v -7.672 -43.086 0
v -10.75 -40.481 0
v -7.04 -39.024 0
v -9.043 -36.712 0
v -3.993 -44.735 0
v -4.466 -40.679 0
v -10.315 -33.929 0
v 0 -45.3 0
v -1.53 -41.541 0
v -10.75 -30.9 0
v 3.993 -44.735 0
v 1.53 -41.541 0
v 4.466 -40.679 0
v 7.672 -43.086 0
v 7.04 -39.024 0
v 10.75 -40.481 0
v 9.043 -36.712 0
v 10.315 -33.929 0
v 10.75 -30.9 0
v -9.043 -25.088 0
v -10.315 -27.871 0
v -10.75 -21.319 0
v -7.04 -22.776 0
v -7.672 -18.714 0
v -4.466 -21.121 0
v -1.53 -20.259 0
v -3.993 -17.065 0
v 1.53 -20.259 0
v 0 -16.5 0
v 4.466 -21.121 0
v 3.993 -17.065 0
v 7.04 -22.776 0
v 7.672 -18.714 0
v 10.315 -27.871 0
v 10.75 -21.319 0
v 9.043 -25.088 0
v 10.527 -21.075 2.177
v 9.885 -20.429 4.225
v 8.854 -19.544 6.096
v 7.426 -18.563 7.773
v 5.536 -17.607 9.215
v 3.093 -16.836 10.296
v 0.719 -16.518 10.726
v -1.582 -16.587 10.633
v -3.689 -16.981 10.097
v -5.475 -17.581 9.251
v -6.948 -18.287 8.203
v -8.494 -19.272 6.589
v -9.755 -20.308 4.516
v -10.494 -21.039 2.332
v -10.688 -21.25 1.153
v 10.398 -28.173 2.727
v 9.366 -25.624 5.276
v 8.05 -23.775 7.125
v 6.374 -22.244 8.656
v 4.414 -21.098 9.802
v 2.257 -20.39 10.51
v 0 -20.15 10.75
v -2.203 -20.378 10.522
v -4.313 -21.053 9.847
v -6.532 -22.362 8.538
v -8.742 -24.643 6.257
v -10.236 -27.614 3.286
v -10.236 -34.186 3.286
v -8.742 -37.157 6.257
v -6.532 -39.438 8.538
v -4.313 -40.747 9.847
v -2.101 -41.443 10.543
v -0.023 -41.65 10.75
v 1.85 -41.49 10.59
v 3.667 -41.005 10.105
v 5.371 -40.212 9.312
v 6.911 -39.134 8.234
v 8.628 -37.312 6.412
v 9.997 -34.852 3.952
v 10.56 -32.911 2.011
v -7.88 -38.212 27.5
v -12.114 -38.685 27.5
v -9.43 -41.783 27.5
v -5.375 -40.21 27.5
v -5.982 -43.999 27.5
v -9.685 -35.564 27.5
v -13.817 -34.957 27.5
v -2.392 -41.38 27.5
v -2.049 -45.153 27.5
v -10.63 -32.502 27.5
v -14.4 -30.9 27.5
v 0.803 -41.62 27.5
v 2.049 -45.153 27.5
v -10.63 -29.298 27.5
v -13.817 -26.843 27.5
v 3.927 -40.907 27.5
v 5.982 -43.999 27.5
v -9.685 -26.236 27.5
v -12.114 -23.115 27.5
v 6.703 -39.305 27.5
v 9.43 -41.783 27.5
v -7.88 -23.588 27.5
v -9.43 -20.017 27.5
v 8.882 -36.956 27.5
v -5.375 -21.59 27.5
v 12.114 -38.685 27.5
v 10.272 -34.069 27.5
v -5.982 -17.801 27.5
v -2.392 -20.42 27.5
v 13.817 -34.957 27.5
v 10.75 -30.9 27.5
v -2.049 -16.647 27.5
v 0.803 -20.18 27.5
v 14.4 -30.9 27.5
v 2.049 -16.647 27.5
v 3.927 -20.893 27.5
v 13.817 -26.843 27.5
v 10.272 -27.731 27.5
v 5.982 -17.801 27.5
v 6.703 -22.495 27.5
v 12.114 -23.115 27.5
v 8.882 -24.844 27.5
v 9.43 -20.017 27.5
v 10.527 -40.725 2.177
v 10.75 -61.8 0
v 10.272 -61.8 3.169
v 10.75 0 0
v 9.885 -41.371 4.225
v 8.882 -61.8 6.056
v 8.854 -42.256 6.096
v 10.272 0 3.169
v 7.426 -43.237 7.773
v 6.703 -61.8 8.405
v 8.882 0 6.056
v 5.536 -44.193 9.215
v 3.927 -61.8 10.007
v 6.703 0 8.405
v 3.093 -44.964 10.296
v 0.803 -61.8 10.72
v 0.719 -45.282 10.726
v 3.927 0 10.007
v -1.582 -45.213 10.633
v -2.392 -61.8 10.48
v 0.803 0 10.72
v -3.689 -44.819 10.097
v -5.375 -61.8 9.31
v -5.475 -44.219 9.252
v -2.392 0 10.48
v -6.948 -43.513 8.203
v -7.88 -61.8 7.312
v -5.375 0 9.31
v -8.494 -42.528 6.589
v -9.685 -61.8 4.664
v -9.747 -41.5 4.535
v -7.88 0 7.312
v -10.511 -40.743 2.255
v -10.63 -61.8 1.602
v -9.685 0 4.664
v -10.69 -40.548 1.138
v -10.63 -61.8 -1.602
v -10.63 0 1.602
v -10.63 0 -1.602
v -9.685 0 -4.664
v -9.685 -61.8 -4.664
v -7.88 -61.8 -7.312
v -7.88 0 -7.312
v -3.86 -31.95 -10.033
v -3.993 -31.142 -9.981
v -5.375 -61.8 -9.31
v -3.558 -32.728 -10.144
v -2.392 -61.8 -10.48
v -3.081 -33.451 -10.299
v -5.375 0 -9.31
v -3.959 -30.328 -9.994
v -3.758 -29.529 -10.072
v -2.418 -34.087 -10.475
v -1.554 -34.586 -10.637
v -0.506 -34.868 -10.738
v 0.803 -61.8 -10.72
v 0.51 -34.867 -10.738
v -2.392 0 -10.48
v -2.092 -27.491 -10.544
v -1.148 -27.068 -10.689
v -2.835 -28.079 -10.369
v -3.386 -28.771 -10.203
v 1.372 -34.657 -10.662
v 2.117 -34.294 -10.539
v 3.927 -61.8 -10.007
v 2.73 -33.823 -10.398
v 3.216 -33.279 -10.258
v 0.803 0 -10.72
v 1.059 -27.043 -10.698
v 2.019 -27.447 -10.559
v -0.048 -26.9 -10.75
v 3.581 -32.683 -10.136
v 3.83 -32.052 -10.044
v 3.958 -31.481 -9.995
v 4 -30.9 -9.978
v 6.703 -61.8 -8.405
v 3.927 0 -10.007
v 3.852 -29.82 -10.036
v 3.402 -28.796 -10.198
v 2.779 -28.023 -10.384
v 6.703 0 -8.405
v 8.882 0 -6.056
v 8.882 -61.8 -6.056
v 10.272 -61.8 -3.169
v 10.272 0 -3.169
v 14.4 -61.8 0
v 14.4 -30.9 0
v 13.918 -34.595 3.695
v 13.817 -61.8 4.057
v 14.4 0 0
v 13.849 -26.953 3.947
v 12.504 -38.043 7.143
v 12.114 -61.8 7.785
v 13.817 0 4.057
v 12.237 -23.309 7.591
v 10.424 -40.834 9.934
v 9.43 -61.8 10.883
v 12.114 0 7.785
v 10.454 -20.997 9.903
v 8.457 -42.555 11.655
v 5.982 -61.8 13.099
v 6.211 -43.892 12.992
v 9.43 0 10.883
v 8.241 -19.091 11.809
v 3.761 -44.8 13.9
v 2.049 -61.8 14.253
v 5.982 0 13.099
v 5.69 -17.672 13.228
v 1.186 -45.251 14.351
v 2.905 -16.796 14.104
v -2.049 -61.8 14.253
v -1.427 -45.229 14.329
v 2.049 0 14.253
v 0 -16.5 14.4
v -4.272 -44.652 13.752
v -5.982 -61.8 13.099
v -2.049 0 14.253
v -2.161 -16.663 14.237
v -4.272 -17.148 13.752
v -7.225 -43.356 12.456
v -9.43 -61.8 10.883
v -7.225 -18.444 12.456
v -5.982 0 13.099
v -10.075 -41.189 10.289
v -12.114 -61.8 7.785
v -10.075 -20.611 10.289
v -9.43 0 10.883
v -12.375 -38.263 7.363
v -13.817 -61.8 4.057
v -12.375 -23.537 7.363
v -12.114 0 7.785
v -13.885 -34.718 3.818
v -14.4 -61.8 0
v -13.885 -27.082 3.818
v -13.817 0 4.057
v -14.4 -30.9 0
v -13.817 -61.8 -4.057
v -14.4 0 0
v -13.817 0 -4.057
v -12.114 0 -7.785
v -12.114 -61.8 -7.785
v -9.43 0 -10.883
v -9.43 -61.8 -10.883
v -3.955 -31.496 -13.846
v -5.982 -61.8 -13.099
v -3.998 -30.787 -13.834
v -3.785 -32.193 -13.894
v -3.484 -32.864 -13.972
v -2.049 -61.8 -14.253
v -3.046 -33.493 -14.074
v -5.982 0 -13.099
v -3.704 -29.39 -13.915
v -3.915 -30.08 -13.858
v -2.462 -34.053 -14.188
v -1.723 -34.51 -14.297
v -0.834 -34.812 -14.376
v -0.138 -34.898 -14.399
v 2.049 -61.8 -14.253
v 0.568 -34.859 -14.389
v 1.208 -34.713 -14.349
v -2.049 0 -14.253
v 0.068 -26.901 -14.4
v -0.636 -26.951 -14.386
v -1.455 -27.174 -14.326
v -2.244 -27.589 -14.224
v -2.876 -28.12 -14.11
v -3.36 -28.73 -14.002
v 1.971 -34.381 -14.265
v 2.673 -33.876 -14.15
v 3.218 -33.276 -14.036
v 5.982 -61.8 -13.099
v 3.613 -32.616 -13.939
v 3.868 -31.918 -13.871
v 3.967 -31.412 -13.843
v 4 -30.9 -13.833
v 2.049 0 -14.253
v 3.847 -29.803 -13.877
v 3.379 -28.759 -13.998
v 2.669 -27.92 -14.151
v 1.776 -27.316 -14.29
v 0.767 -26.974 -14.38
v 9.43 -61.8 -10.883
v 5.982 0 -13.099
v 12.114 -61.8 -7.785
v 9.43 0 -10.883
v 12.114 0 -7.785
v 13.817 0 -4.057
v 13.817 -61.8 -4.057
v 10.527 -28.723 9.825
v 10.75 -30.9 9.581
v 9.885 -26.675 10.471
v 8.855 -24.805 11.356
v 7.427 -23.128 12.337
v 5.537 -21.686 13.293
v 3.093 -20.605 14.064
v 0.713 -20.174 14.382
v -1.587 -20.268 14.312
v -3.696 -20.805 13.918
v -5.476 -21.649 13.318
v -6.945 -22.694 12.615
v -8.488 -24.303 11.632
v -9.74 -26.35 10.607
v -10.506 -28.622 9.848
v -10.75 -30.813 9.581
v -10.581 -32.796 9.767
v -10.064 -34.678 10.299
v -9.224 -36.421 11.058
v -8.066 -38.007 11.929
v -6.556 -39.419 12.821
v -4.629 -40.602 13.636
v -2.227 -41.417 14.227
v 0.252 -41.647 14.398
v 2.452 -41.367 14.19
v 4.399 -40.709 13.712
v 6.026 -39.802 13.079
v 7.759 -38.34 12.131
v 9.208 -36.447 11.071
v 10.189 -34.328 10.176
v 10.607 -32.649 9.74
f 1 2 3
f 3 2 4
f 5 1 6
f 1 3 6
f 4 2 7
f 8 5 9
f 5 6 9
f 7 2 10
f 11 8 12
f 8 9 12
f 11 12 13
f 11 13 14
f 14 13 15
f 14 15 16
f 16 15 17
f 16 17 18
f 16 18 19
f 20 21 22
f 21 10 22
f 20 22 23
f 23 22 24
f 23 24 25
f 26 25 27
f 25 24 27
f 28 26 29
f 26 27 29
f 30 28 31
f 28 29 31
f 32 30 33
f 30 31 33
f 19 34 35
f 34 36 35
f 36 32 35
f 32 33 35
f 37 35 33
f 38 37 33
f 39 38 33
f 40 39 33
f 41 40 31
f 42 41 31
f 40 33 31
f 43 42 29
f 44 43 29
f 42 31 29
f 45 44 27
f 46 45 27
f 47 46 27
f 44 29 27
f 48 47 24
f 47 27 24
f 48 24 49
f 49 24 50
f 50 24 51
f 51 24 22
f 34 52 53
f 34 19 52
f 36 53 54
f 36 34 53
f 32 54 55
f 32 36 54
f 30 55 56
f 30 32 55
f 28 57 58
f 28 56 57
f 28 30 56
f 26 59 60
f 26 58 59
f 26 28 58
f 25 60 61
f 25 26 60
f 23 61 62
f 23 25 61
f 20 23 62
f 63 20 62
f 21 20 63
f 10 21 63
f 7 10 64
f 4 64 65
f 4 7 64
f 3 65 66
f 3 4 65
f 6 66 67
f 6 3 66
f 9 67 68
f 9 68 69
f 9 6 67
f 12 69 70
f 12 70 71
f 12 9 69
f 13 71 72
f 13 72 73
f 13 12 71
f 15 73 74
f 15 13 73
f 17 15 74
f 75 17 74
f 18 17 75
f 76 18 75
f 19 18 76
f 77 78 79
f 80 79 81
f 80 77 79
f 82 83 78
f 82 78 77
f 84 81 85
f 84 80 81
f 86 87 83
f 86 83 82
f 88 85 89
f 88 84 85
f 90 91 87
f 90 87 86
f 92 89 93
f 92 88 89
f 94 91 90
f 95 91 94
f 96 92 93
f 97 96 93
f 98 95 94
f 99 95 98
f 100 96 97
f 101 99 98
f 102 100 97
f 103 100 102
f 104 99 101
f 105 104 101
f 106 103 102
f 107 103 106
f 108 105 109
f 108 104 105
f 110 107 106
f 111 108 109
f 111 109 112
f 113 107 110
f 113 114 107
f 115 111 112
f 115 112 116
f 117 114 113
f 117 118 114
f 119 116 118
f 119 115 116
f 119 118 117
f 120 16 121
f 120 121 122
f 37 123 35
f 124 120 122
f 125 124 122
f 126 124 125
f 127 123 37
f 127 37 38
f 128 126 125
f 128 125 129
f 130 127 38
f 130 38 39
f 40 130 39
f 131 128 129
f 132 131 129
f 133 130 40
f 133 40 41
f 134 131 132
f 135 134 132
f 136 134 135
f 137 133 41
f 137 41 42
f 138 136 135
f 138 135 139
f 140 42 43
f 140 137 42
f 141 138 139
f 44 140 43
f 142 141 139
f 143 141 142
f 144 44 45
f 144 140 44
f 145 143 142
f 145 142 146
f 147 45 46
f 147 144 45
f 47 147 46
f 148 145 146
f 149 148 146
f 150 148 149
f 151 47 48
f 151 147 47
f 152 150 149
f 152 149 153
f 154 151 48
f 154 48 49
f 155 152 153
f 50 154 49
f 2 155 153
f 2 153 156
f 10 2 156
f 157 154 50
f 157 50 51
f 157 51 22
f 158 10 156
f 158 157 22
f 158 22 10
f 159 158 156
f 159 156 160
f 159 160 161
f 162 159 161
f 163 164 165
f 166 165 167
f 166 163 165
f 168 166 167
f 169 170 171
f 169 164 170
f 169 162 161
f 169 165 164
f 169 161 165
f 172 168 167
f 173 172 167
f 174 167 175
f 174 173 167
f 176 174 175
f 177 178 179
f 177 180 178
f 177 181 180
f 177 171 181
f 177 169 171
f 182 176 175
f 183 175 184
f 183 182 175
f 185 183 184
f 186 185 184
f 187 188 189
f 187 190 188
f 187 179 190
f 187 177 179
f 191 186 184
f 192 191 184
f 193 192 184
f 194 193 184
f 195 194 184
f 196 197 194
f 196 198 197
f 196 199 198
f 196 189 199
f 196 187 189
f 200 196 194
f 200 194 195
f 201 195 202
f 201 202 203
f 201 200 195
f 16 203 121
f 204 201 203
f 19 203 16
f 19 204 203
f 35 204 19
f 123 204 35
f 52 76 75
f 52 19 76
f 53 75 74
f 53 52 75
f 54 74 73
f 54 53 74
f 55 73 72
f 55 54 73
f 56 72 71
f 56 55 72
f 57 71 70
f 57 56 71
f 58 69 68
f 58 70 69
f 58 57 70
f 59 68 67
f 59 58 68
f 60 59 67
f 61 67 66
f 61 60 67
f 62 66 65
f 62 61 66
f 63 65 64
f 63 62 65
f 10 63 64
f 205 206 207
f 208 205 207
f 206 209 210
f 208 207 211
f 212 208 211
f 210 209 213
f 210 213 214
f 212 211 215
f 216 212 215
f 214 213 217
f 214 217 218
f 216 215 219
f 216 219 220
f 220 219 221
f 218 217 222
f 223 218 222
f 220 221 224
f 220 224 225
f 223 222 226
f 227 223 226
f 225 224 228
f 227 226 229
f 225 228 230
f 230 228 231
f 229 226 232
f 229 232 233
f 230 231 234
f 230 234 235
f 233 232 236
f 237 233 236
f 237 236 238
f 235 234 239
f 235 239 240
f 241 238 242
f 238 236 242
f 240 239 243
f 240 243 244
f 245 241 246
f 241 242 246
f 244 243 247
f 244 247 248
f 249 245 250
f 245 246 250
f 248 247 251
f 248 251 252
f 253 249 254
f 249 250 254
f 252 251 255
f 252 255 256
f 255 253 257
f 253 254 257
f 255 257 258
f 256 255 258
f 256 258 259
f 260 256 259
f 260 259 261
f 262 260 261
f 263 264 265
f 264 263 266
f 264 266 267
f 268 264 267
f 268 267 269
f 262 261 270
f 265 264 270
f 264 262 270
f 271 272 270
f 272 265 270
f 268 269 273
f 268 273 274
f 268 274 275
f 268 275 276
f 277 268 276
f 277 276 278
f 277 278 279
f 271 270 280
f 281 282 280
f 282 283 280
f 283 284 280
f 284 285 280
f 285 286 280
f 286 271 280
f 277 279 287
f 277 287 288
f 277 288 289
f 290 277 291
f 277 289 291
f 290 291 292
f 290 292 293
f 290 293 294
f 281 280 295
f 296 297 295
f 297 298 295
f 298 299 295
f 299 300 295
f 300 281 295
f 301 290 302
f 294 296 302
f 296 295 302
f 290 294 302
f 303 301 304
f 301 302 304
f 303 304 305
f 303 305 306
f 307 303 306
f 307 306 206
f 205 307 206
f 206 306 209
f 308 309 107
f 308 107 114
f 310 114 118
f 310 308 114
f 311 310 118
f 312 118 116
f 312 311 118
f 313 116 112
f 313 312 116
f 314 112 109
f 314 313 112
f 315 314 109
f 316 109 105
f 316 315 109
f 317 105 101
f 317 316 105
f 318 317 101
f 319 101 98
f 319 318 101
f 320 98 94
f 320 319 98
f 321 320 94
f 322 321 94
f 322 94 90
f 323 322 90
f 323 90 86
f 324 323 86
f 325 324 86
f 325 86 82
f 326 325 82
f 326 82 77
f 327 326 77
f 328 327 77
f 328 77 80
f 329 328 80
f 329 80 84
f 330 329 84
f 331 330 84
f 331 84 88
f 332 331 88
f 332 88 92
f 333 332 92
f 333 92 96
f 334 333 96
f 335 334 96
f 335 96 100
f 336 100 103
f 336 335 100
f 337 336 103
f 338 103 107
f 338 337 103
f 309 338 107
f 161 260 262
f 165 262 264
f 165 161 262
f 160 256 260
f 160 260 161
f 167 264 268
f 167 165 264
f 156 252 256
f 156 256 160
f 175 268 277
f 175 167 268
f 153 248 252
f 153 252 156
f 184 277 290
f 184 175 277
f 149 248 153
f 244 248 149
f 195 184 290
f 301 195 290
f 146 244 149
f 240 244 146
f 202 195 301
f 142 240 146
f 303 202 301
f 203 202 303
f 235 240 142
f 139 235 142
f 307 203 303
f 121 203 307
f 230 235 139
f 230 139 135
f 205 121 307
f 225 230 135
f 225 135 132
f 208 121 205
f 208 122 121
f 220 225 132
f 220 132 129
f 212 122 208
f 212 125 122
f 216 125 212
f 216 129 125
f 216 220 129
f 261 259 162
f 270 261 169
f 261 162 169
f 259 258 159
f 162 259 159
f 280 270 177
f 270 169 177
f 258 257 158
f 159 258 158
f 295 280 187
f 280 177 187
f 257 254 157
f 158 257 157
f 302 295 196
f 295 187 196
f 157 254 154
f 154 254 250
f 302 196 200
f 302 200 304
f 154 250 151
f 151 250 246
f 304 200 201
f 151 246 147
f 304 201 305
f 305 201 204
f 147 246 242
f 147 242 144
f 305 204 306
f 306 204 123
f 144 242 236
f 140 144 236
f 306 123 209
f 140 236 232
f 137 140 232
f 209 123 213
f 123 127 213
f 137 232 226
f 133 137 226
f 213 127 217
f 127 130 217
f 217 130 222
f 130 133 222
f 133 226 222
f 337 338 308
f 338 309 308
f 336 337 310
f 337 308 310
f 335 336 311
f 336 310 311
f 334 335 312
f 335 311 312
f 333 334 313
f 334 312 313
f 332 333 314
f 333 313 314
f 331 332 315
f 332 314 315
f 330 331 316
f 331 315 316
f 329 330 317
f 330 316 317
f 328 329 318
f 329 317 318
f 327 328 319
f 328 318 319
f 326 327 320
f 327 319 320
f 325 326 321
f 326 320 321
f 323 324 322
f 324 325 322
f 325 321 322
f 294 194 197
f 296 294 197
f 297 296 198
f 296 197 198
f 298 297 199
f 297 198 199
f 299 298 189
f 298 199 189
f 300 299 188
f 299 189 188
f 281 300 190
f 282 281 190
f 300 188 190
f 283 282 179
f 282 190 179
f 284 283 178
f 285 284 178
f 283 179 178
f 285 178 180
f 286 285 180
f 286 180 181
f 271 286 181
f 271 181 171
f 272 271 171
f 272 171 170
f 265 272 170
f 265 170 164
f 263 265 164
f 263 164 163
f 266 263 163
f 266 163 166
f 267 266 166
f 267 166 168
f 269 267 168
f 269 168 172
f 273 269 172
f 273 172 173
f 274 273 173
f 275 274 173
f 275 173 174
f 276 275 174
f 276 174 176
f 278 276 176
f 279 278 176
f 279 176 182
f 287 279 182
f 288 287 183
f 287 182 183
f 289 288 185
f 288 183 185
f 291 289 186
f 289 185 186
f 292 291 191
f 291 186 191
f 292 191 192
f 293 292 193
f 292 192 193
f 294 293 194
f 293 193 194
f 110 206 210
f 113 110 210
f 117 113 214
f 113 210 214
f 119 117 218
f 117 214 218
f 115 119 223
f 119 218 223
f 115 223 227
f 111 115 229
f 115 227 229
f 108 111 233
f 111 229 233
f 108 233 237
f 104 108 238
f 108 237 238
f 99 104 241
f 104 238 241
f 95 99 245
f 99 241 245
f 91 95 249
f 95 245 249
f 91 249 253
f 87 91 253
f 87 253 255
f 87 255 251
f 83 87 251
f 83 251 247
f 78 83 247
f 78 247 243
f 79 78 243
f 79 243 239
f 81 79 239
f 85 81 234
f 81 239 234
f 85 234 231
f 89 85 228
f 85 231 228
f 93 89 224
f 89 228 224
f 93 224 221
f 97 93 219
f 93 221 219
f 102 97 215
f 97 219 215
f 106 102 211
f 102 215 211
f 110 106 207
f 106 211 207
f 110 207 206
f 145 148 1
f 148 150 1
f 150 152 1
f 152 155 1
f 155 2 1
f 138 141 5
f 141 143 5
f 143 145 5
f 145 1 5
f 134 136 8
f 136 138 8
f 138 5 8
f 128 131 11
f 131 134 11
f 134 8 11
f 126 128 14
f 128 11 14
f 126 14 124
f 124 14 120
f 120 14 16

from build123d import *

# Parameters (mm, degrees)
F0_R     = 14.4
F0_R_2   = 10.75
F1_DEPTH = 61.8
F2_R     = 14.4
F2_R_2   = 10.75
F3_DEPTH = 27.5
F5_D     = 8
F5_DEPTH = 14.401


with BuildPart() as f1:
    # F0 (on Front) → F1 (new body)
    with BuildSketch(Plane.XZ):
        Circle(F0_R)
        Circle(F0_R_2, mode=Mode.SUBTRACT)
    extrude(amount=F1_DEPTH)

    # F2 (on Top) → F3 (join)
    with BuildSketch(Plane.XY):
        with Locations((0, -30.9)):
            Circle(F2_R)
        with Locations((0, -30.9)):
            Circle(F2_R_2, mode=Mode.SUBTRACT)
    extrude(amount=F3_DEPTH)

    # F5 (through all, one way)
    with BuildSketch(Plane.XY):
        with Locations((0, -30.9)):
            Circle(F5_D / 2)
    extrude(amount=-F5_DEPTH, mode=Mode.SUBTRACT)


solid = f1.part
